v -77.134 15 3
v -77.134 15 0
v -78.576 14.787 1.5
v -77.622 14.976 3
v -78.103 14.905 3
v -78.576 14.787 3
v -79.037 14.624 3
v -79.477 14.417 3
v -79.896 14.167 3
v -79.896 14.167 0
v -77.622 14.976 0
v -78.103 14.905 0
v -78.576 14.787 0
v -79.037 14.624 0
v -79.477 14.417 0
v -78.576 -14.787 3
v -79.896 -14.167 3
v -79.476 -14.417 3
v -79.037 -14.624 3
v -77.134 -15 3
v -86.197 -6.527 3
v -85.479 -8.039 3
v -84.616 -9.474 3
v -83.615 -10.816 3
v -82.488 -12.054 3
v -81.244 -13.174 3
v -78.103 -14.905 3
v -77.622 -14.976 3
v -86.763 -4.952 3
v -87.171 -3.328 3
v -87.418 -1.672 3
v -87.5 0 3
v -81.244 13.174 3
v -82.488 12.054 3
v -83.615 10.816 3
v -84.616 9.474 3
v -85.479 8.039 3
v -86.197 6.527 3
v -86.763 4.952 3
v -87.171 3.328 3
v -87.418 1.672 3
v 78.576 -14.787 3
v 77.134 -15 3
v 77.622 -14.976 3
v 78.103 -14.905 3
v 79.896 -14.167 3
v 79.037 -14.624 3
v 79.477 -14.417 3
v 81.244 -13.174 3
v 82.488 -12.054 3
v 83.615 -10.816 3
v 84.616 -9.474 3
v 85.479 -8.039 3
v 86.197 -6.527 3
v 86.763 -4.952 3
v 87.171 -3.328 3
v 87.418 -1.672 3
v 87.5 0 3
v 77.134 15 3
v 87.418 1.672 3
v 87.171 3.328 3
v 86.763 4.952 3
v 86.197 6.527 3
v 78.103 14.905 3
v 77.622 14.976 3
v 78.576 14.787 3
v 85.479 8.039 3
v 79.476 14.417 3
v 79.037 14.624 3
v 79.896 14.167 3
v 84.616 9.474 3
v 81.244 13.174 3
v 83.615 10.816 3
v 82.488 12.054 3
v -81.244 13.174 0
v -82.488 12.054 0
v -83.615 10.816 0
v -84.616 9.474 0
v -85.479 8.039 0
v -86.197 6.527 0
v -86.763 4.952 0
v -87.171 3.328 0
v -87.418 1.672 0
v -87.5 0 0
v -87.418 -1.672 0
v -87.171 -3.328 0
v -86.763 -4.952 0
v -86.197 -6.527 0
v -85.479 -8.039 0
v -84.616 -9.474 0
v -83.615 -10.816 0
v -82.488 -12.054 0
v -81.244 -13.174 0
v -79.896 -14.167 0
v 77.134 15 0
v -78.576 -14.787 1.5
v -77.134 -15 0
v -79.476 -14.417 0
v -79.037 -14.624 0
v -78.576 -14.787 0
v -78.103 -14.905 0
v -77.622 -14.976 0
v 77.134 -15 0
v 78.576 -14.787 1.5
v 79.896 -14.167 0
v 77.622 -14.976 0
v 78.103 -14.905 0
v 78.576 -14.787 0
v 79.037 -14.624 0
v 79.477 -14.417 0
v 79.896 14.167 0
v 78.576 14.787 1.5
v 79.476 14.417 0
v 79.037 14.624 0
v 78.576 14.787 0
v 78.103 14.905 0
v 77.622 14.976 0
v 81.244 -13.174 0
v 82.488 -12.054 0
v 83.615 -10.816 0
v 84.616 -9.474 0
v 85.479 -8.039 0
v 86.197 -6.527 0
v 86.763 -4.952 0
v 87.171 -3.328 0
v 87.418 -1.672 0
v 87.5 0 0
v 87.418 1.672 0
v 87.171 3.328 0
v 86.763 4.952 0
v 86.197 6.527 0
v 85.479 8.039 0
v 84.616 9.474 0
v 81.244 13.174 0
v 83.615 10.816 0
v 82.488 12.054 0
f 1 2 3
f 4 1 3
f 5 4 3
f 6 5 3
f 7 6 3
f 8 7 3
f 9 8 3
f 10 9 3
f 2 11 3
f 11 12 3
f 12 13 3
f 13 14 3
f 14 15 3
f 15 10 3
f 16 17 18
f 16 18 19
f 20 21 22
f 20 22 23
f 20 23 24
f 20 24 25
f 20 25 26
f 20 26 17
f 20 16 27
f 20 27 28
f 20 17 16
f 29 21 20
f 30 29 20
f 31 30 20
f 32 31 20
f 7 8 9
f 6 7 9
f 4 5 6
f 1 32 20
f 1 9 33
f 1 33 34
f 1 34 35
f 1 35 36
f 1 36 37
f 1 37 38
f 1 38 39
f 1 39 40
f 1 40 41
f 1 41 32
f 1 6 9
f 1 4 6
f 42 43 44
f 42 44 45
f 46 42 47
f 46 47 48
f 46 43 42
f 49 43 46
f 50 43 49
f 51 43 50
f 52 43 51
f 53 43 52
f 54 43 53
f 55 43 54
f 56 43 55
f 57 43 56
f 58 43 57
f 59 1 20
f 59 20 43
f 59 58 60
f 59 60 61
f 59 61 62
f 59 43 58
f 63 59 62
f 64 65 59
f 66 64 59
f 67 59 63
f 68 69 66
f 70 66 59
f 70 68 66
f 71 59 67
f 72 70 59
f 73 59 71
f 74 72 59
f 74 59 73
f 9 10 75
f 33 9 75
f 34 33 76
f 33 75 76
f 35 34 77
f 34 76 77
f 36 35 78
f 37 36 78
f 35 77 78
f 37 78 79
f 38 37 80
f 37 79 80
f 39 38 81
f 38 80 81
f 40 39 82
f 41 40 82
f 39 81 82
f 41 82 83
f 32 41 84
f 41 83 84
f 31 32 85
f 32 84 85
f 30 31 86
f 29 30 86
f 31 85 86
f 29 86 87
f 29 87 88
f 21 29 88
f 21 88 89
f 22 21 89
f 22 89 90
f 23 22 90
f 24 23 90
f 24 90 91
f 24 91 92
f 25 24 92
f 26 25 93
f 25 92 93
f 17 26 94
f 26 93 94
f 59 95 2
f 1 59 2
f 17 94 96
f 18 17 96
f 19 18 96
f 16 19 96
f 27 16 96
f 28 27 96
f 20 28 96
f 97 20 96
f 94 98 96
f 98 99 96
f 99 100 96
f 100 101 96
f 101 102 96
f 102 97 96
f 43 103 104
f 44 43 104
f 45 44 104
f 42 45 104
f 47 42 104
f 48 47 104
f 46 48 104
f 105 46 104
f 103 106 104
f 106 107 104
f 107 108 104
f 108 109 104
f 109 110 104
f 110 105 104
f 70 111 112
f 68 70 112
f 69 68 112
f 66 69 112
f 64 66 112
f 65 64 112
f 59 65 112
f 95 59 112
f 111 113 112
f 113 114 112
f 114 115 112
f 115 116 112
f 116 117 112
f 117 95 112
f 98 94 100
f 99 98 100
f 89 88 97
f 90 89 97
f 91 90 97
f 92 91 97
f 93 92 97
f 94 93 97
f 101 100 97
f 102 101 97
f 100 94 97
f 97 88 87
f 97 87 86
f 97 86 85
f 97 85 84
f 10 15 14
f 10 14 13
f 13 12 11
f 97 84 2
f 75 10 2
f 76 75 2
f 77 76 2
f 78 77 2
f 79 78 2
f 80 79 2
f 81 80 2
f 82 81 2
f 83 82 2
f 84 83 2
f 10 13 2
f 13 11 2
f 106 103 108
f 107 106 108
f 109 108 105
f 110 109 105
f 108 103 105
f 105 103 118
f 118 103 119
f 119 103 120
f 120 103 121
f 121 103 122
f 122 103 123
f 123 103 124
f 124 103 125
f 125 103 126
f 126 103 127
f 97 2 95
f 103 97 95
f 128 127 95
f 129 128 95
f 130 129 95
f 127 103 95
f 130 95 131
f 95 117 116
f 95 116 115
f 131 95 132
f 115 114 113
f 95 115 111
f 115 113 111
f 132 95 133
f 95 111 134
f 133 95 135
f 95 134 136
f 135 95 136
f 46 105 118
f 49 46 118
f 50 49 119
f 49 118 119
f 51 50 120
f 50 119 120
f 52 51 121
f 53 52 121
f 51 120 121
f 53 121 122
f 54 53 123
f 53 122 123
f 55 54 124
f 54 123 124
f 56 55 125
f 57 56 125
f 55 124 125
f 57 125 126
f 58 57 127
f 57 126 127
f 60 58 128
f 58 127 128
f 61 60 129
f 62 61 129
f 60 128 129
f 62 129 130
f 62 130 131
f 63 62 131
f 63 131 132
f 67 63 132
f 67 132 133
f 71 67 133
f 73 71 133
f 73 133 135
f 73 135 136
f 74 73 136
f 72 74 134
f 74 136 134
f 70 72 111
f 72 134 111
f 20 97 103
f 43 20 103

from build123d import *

# Parameters (mm, degrees)
SALIENTE_EXTRUIR1_DEPTH = 3


with BuildPart() as part:
    # Croquis1 → Saliente-Extruir1 (new body)
    with BuildSketch(Plane.XY):
        with BuildLine():
            Line((77.13407836, 15), (-77.13407836, 15))
            add(Edge.make_bspline(
                [(-77.13407836, 15), (-77.871262638, 15), (-78.576496818, 14.787307583), (-79.282235227, 14.574463094), (-79.896125243, 14.167315569)],
                knots=[0, 0, 0, 0.5, 0.5, 1, 1, 1], degree=2))
            ThreePointArc((-79.896125243, 14.167315569), (-87.5, 0), (-79.896125243, -14.167315569))
            add(Edge.make_bspline(
                [(-79.896125243, -14.167315569), (-79.281776873, -14.574767086), (-78.576496886, -14.787307562), (-77.870712638, -15), (-77.13407836, -15)],
                knots=[0, 0, 0, 0.5, 0.5, 1, 1, 1], degree=2))
            Line((-77.13407836, -15), (77.13407836, -15))
            add(Edge.make_bspline(
                [(77.13407836, -15), (77.871262638, -15), (78.576496818, -14.787307583), (79.282235227, -14.574463094), (79.896125243, -14.167315569)],
                knots=[0, 0, 0, 0.5, 0.5, 1, 1, 1], degree=2))
            ThreePointArc((79.896125243, -14.167315569), (87.5, 0), (79.896125243, 14.167315569))
            add(Edge.make_bspline(
                [(79.896125243, 14.167315569), (79.281776873, 14.574767086), (78.576496886, 14.787307562), (77.870712638, 15), (77.13407836, 15)],
                knots=[0, 0, 0, 0.5, 0.5, 1, 1, 1], degree=2))
        make_face()
    extrude(amount=SALIENTE_EXTRUIR1_DEPTH)


solid = part.part
